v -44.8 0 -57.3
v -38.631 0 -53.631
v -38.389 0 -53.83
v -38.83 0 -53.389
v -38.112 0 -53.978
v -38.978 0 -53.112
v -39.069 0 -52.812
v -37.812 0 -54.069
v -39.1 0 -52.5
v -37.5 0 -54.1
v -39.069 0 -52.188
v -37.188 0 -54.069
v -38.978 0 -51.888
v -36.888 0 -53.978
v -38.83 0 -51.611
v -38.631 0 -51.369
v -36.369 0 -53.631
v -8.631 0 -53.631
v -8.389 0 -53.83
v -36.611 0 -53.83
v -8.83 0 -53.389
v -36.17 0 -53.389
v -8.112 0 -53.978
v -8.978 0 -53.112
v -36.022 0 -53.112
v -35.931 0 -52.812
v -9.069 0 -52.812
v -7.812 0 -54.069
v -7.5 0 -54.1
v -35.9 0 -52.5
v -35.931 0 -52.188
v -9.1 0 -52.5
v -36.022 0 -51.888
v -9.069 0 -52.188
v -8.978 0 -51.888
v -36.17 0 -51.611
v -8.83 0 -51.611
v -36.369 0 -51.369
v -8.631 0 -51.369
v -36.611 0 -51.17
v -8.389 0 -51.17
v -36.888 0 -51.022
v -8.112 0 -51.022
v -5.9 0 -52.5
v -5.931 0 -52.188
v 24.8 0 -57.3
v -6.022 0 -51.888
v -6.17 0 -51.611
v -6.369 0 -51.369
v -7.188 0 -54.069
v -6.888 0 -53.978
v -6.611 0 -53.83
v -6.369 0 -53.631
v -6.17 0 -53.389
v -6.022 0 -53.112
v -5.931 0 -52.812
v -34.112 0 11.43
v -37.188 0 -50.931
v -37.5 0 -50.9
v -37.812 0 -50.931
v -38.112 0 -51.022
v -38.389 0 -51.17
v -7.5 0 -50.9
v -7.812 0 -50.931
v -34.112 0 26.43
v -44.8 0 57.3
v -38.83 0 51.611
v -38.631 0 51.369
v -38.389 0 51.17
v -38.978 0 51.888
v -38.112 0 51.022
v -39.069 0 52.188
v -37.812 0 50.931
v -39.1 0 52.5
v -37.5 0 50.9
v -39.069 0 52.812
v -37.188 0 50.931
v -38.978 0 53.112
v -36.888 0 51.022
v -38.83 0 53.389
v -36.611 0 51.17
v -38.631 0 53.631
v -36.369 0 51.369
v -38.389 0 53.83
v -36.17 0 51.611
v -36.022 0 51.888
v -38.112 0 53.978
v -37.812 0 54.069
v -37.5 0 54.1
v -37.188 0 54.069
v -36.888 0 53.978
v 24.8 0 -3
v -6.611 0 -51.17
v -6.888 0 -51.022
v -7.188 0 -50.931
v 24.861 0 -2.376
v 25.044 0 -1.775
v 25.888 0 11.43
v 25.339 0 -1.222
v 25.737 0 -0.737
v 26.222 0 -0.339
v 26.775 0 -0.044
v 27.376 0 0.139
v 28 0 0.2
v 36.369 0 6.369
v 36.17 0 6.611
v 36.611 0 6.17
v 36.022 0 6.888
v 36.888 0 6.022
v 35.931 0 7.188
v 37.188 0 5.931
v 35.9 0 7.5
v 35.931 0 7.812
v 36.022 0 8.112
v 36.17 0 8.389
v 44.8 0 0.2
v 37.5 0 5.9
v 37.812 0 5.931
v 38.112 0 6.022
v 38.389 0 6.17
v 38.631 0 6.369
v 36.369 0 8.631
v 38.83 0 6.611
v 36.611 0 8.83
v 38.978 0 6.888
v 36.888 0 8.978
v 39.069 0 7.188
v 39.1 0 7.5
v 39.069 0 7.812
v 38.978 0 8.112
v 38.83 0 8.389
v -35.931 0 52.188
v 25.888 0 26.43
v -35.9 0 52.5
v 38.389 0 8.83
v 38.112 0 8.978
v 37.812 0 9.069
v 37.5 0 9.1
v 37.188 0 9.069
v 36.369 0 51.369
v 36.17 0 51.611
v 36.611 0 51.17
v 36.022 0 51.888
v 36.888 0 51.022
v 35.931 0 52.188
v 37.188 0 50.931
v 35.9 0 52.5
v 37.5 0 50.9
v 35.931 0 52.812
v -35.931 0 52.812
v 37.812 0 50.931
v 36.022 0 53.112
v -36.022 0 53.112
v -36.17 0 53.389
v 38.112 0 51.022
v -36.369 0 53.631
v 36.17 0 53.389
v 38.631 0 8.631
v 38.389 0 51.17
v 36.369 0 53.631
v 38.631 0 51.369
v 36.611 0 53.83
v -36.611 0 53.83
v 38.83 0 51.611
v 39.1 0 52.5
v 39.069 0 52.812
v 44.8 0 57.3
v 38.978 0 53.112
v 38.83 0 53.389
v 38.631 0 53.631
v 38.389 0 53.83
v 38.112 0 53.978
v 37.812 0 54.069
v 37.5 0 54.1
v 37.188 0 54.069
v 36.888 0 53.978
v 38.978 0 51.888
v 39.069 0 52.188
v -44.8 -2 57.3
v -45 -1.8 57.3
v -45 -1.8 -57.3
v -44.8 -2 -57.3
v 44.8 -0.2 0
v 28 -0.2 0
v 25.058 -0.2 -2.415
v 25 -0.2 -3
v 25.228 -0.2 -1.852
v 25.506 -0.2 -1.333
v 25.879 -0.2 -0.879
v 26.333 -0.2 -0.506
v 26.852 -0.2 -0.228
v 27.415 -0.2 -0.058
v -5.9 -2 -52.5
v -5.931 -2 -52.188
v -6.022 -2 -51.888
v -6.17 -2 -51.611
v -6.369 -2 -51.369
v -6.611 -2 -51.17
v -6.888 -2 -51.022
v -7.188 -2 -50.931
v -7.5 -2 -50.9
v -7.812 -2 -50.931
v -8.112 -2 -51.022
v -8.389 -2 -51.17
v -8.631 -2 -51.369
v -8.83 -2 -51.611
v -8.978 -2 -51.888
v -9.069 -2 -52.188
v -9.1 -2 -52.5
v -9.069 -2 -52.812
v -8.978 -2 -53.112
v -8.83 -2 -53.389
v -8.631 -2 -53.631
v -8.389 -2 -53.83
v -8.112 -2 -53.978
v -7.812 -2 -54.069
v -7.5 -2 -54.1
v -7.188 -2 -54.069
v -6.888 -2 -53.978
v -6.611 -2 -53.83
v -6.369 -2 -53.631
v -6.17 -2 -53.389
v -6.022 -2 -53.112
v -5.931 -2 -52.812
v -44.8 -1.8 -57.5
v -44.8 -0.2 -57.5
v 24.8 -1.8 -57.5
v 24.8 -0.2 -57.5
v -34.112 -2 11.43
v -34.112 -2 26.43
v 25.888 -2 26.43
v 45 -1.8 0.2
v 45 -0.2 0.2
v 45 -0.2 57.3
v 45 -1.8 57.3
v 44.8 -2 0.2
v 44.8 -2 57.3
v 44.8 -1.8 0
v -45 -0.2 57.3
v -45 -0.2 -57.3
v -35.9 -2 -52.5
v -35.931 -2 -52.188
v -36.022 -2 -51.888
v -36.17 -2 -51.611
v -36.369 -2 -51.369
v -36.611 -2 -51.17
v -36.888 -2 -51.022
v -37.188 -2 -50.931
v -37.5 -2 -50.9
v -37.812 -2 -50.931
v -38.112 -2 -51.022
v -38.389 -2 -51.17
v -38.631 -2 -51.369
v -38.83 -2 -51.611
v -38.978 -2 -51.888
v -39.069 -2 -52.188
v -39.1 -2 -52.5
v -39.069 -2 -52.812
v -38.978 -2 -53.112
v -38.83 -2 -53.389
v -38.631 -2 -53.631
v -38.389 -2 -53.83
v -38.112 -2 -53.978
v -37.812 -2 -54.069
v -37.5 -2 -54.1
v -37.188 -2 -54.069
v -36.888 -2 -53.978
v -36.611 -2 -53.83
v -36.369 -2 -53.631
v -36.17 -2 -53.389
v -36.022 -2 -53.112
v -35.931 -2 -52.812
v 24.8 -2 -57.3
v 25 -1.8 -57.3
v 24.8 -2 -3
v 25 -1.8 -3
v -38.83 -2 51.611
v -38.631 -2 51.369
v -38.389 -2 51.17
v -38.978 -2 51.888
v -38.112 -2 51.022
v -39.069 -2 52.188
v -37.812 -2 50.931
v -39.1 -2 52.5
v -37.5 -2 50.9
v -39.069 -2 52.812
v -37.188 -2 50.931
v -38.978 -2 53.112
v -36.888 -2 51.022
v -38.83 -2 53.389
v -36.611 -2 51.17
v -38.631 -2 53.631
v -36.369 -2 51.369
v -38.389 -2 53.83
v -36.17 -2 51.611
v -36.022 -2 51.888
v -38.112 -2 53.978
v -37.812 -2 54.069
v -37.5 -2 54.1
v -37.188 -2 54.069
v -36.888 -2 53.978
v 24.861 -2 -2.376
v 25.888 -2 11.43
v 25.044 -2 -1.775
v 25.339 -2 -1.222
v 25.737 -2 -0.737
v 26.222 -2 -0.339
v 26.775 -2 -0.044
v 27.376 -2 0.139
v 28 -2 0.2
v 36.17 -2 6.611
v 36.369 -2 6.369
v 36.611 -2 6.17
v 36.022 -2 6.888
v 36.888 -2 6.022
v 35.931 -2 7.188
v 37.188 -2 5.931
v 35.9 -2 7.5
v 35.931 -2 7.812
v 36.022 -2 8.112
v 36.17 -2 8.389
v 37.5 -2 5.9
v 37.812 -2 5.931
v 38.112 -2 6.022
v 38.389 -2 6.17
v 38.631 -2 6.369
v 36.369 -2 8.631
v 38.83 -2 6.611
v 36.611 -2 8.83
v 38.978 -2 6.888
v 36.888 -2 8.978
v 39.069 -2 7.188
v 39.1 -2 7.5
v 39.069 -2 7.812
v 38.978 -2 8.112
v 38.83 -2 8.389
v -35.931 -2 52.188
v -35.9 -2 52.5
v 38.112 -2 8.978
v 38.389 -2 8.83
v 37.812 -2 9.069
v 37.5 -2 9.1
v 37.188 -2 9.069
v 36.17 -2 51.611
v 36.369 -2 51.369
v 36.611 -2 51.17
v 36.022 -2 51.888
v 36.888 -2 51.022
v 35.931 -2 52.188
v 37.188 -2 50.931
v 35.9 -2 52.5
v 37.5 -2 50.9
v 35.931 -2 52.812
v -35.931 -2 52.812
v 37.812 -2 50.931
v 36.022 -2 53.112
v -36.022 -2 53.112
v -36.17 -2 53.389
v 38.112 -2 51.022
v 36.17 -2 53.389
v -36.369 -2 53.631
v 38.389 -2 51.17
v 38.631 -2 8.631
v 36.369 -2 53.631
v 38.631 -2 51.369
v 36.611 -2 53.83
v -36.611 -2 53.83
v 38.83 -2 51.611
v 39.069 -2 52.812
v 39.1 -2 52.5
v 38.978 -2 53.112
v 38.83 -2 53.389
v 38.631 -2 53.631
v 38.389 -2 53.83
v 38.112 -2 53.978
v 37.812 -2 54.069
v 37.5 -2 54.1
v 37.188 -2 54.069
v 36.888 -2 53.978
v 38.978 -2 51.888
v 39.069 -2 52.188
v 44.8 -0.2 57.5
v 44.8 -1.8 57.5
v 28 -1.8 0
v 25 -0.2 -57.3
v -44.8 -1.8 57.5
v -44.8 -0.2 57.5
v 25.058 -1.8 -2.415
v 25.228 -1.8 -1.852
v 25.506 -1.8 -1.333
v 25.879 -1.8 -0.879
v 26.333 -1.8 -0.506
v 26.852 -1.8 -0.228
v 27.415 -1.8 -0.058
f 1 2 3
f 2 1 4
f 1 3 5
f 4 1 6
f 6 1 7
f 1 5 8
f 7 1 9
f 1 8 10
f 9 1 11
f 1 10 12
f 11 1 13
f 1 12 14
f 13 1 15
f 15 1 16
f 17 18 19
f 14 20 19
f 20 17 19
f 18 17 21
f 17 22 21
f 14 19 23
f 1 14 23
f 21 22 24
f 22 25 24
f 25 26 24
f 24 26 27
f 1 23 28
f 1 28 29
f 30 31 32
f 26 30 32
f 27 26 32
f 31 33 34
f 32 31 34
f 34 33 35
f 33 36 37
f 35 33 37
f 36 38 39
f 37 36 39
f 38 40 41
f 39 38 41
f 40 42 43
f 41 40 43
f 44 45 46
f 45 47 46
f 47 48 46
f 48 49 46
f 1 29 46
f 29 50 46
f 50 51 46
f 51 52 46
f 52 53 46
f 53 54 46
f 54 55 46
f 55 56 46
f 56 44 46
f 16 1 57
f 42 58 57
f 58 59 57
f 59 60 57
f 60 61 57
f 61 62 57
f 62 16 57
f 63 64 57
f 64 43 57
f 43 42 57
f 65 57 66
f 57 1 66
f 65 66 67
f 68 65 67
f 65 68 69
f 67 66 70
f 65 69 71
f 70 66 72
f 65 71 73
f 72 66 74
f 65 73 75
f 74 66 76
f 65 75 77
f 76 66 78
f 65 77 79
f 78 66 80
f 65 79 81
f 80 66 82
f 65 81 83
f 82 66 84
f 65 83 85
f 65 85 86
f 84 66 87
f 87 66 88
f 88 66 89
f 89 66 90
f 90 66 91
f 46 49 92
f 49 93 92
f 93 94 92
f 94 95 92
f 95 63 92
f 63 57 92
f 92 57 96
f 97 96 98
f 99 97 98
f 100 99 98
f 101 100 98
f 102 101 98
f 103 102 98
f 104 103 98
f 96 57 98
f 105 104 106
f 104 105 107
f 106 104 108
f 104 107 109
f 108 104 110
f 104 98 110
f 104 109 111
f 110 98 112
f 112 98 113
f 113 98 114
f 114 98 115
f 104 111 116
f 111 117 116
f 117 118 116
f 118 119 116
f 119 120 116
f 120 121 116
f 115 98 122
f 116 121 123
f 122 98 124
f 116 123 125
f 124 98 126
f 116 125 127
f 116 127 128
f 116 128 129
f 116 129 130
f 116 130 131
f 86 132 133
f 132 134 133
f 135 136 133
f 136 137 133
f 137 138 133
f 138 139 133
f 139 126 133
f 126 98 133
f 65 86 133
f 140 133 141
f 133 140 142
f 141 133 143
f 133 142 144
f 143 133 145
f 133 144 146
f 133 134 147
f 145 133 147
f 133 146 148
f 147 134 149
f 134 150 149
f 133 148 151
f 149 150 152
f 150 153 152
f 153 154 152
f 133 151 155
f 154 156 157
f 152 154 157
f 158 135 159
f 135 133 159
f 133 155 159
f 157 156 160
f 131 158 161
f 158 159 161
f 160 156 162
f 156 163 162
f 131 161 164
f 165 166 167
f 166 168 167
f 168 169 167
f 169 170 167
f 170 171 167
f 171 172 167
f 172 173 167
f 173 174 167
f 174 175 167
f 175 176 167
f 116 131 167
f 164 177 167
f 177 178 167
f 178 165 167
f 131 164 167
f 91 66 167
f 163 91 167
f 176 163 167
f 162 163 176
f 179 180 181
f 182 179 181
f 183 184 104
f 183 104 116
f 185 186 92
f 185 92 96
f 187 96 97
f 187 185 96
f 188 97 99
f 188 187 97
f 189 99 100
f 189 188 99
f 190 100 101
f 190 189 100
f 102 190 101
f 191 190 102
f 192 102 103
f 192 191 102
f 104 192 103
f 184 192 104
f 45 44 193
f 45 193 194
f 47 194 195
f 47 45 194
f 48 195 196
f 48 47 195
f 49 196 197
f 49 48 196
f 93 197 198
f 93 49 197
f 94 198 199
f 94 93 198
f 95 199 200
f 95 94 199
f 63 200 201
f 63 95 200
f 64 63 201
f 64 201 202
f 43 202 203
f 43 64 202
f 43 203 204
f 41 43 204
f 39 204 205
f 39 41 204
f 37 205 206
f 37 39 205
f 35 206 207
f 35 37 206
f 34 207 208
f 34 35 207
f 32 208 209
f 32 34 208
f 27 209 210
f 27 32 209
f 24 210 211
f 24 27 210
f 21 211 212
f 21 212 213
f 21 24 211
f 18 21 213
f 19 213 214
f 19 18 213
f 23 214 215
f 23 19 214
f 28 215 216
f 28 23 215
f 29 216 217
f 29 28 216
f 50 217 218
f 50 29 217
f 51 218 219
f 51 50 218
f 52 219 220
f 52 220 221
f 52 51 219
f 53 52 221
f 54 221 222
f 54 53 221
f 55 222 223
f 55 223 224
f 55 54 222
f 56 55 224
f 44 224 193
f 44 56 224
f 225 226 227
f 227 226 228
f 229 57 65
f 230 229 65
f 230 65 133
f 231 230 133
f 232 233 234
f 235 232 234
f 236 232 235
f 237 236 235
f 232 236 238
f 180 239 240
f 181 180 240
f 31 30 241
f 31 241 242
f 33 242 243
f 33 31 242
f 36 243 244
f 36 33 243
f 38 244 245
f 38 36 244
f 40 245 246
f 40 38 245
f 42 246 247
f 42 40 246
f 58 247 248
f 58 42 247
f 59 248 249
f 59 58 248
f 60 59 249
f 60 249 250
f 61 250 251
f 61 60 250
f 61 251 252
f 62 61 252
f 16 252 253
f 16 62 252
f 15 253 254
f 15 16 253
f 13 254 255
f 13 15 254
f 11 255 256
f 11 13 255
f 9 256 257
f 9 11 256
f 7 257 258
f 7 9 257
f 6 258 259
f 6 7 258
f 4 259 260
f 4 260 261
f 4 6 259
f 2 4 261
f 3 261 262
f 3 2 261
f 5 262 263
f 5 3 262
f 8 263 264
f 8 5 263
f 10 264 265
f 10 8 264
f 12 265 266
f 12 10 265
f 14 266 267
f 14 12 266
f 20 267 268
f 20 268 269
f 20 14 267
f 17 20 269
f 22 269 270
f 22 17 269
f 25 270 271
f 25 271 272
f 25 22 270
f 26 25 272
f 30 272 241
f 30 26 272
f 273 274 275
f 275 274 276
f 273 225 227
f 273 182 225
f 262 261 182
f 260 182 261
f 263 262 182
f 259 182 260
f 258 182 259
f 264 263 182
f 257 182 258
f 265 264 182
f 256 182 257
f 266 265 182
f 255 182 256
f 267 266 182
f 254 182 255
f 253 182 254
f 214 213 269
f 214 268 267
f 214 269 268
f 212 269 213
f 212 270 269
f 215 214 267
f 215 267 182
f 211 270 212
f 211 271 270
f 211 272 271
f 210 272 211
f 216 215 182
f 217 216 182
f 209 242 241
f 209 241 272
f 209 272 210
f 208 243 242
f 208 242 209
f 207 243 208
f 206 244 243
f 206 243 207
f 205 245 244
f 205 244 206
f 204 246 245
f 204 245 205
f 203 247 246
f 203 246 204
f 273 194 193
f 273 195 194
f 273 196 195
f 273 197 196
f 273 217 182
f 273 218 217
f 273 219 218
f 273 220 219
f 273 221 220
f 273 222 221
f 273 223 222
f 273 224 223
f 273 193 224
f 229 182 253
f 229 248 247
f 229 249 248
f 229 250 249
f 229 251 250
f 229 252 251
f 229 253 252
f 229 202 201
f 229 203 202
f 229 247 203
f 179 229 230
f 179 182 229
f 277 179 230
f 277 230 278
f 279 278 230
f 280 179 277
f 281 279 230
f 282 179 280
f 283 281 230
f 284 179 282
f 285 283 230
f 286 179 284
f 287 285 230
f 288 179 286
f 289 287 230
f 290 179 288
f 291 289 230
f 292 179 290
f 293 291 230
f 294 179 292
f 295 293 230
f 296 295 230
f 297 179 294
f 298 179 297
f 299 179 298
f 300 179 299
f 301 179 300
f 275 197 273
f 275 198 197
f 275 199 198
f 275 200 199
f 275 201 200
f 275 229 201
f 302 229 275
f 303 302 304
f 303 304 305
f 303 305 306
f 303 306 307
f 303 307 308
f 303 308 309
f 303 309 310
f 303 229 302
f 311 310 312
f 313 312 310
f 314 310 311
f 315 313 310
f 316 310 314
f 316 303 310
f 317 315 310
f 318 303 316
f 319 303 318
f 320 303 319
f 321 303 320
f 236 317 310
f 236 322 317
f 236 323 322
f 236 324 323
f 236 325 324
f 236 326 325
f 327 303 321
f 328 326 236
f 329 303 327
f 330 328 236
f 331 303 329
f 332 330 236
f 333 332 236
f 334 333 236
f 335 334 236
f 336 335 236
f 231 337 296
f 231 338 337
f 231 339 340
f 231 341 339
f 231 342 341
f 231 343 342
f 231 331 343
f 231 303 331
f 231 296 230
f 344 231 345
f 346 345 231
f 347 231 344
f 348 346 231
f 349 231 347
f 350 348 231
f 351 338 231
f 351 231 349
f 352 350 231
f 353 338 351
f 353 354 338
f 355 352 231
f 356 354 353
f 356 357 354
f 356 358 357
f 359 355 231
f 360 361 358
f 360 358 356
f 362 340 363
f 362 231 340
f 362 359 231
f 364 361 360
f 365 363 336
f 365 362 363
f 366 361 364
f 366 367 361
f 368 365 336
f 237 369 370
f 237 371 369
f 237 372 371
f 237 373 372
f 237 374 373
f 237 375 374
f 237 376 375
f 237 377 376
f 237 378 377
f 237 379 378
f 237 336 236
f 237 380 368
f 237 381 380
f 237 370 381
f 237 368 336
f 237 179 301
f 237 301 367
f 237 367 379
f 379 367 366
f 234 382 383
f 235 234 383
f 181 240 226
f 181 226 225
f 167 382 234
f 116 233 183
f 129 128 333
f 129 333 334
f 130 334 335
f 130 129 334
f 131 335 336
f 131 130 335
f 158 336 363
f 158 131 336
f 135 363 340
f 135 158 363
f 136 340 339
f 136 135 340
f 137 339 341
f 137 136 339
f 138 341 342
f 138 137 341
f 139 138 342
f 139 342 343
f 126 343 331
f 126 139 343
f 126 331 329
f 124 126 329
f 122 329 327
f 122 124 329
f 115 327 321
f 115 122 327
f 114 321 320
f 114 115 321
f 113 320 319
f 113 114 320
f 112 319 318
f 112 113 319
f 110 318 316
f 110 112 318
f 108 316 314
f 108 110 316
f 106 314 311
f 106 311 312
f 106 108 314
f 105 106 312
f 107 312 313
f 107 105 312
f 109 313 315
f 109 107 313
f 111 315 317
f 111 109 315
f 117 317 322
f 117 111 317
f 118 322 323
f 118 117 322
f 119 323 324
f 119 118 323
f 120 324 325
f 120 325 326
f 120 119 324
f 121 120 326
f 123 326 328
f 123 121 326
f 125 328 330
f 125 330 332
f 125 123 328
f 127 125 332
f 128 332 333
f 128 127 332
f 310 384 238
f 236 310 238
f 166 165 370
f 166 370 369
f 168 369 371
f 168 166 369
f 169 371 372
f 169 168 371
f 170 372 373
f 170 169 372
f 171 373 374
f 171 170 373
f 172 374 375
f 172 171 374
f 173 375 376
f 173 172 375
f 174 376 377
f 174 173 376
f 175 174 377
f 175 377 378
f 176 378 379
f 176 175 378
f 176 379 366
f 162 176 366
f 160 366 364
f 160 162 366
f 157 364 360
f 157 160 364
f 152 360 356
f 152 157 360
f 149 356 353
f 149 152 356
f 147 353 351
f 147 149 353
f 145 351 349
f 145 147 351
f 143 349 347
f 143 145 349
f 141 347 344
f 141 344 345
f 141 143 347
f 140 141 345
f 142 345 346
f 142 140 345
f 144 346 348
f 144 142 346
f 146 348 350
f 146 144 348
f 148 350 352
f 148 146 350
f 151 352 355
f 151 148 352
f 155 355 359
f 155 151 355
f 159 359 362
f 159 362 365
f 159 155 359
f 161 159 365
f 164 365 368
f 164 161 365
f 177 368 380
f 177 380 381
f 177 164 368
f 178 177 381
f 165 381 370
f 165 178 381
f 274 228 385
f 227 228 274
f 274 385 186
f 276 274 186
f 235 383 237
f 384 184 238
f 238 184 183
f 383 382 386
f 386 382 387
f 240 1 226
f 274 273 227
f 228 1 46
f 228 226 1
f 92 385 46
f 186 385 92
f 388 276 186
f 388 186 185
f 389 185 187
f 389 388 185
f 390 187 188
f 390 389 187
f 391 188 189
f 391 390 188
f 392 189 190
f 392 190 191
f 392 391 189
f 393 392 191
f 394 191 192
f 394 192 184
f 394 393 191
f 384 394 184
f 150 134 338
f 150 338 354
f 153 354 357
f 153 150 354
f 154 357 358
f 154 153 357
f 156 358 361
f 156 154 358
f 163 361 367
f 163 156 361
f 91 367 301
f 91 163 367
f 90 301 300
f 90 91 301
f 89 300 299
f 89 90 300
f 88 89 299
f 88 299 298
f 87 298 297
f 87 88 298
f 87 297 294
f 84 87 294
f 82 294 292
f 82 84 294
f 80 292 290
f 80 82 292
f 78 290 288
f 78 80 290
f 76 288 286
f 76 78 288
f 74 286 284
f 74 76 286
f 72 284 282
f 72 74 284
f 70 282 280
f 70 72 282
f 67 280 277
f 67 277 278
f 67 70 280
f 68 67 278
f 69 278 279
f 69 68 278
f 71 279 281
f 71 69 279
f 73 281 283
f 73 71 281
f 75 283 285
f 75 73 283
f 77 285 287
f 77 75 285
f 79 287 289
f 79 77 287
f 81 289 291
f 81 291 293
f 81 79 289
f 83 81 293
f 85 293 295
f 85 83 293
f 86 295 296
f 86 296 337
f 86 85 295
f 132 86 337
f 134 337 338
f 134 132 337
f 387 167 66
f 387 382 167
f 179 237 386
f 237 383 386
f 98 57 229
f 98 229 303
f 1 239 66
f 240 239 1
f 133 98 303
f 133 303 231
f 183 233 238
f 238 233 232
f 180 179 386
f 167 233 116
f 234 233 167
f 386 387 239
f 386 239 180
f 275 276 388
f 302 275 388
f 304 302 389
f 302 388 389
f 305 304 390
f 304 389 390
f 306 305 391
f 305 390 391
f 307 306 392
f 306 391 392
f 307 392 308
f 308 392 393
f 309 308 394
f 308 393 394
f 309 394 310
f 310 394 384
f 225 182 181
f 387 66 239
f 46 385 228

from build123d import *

# Parameters (mm, degrees)
F0_R     = 1.6
F0_W     = 60
F0_H     = 15
F1_DEPTH = 2
F2_R     = 3
F3_SIZE  = 0.2


with BuildPart() as f1:
    # F0 (on Front) → F1 (new body)
    with BuildSketch(Plane.XZ):
        Polygon((-45, -57.5), (25, -57.5), (25, 0), (45, 0), (45, 57.5), (-45, 57.5), align=None)
        with Locations((-37.5, -52.5)):
            Circle(F0_R, mode=Mode.SUBTRACT)
        with Locations((-7.5, -52.5)):
            Circle(F0_R, mode=Mode.SUBTRACT)
        with Locations((-4.111738, 18.929576)):
            Rectangle(F0_W, F0_H, mode=Mode.SUBTRACT)
        with Locations((-37.5, 52.5)):
            Circle(F0_R, mode=Mode.SUBTRACT)
        with Locations((37.5, 7.5)):
            Circle(F0_R, mode=Mode.SUBTRACT)
        with Locations((37.5, 52.5)):
            Circle(F0_R, mode=Mode.SUBTRACT)
    extrude(amount=F1_DEPTH)

    # F2
    f2_edges = [f1.edges().sort_by_distance(p)[0] for p in [
        (25, -1, 0),
    ]]
    fillet(f2_edges, radius=F2_R)

    # F3
    f3_edges = [f1.edges().sort_by_distance(p)[0] for p in [
        (0, -2, 57.5),
        (0, 0, 57.5),
        (45, -1, 57.5),
        (45, 0, 28.75),
        (36.5, -2, 0),
        (45, -2, 28.75),
        (-10, -2, -57.5),
        (45, -1, 0),
        (36.5, 0, 0),
        (25, -1, -57.5),
        (-10, 0, -57.5),
        (-45, 0, 0),
        (-45, -2, 0),
        (-45, -1, 57.5),
        (-45, -1, -57.5),
    ]]
    chamfer(f3_edges, length=F3_SIZE)


solid = f1.part
